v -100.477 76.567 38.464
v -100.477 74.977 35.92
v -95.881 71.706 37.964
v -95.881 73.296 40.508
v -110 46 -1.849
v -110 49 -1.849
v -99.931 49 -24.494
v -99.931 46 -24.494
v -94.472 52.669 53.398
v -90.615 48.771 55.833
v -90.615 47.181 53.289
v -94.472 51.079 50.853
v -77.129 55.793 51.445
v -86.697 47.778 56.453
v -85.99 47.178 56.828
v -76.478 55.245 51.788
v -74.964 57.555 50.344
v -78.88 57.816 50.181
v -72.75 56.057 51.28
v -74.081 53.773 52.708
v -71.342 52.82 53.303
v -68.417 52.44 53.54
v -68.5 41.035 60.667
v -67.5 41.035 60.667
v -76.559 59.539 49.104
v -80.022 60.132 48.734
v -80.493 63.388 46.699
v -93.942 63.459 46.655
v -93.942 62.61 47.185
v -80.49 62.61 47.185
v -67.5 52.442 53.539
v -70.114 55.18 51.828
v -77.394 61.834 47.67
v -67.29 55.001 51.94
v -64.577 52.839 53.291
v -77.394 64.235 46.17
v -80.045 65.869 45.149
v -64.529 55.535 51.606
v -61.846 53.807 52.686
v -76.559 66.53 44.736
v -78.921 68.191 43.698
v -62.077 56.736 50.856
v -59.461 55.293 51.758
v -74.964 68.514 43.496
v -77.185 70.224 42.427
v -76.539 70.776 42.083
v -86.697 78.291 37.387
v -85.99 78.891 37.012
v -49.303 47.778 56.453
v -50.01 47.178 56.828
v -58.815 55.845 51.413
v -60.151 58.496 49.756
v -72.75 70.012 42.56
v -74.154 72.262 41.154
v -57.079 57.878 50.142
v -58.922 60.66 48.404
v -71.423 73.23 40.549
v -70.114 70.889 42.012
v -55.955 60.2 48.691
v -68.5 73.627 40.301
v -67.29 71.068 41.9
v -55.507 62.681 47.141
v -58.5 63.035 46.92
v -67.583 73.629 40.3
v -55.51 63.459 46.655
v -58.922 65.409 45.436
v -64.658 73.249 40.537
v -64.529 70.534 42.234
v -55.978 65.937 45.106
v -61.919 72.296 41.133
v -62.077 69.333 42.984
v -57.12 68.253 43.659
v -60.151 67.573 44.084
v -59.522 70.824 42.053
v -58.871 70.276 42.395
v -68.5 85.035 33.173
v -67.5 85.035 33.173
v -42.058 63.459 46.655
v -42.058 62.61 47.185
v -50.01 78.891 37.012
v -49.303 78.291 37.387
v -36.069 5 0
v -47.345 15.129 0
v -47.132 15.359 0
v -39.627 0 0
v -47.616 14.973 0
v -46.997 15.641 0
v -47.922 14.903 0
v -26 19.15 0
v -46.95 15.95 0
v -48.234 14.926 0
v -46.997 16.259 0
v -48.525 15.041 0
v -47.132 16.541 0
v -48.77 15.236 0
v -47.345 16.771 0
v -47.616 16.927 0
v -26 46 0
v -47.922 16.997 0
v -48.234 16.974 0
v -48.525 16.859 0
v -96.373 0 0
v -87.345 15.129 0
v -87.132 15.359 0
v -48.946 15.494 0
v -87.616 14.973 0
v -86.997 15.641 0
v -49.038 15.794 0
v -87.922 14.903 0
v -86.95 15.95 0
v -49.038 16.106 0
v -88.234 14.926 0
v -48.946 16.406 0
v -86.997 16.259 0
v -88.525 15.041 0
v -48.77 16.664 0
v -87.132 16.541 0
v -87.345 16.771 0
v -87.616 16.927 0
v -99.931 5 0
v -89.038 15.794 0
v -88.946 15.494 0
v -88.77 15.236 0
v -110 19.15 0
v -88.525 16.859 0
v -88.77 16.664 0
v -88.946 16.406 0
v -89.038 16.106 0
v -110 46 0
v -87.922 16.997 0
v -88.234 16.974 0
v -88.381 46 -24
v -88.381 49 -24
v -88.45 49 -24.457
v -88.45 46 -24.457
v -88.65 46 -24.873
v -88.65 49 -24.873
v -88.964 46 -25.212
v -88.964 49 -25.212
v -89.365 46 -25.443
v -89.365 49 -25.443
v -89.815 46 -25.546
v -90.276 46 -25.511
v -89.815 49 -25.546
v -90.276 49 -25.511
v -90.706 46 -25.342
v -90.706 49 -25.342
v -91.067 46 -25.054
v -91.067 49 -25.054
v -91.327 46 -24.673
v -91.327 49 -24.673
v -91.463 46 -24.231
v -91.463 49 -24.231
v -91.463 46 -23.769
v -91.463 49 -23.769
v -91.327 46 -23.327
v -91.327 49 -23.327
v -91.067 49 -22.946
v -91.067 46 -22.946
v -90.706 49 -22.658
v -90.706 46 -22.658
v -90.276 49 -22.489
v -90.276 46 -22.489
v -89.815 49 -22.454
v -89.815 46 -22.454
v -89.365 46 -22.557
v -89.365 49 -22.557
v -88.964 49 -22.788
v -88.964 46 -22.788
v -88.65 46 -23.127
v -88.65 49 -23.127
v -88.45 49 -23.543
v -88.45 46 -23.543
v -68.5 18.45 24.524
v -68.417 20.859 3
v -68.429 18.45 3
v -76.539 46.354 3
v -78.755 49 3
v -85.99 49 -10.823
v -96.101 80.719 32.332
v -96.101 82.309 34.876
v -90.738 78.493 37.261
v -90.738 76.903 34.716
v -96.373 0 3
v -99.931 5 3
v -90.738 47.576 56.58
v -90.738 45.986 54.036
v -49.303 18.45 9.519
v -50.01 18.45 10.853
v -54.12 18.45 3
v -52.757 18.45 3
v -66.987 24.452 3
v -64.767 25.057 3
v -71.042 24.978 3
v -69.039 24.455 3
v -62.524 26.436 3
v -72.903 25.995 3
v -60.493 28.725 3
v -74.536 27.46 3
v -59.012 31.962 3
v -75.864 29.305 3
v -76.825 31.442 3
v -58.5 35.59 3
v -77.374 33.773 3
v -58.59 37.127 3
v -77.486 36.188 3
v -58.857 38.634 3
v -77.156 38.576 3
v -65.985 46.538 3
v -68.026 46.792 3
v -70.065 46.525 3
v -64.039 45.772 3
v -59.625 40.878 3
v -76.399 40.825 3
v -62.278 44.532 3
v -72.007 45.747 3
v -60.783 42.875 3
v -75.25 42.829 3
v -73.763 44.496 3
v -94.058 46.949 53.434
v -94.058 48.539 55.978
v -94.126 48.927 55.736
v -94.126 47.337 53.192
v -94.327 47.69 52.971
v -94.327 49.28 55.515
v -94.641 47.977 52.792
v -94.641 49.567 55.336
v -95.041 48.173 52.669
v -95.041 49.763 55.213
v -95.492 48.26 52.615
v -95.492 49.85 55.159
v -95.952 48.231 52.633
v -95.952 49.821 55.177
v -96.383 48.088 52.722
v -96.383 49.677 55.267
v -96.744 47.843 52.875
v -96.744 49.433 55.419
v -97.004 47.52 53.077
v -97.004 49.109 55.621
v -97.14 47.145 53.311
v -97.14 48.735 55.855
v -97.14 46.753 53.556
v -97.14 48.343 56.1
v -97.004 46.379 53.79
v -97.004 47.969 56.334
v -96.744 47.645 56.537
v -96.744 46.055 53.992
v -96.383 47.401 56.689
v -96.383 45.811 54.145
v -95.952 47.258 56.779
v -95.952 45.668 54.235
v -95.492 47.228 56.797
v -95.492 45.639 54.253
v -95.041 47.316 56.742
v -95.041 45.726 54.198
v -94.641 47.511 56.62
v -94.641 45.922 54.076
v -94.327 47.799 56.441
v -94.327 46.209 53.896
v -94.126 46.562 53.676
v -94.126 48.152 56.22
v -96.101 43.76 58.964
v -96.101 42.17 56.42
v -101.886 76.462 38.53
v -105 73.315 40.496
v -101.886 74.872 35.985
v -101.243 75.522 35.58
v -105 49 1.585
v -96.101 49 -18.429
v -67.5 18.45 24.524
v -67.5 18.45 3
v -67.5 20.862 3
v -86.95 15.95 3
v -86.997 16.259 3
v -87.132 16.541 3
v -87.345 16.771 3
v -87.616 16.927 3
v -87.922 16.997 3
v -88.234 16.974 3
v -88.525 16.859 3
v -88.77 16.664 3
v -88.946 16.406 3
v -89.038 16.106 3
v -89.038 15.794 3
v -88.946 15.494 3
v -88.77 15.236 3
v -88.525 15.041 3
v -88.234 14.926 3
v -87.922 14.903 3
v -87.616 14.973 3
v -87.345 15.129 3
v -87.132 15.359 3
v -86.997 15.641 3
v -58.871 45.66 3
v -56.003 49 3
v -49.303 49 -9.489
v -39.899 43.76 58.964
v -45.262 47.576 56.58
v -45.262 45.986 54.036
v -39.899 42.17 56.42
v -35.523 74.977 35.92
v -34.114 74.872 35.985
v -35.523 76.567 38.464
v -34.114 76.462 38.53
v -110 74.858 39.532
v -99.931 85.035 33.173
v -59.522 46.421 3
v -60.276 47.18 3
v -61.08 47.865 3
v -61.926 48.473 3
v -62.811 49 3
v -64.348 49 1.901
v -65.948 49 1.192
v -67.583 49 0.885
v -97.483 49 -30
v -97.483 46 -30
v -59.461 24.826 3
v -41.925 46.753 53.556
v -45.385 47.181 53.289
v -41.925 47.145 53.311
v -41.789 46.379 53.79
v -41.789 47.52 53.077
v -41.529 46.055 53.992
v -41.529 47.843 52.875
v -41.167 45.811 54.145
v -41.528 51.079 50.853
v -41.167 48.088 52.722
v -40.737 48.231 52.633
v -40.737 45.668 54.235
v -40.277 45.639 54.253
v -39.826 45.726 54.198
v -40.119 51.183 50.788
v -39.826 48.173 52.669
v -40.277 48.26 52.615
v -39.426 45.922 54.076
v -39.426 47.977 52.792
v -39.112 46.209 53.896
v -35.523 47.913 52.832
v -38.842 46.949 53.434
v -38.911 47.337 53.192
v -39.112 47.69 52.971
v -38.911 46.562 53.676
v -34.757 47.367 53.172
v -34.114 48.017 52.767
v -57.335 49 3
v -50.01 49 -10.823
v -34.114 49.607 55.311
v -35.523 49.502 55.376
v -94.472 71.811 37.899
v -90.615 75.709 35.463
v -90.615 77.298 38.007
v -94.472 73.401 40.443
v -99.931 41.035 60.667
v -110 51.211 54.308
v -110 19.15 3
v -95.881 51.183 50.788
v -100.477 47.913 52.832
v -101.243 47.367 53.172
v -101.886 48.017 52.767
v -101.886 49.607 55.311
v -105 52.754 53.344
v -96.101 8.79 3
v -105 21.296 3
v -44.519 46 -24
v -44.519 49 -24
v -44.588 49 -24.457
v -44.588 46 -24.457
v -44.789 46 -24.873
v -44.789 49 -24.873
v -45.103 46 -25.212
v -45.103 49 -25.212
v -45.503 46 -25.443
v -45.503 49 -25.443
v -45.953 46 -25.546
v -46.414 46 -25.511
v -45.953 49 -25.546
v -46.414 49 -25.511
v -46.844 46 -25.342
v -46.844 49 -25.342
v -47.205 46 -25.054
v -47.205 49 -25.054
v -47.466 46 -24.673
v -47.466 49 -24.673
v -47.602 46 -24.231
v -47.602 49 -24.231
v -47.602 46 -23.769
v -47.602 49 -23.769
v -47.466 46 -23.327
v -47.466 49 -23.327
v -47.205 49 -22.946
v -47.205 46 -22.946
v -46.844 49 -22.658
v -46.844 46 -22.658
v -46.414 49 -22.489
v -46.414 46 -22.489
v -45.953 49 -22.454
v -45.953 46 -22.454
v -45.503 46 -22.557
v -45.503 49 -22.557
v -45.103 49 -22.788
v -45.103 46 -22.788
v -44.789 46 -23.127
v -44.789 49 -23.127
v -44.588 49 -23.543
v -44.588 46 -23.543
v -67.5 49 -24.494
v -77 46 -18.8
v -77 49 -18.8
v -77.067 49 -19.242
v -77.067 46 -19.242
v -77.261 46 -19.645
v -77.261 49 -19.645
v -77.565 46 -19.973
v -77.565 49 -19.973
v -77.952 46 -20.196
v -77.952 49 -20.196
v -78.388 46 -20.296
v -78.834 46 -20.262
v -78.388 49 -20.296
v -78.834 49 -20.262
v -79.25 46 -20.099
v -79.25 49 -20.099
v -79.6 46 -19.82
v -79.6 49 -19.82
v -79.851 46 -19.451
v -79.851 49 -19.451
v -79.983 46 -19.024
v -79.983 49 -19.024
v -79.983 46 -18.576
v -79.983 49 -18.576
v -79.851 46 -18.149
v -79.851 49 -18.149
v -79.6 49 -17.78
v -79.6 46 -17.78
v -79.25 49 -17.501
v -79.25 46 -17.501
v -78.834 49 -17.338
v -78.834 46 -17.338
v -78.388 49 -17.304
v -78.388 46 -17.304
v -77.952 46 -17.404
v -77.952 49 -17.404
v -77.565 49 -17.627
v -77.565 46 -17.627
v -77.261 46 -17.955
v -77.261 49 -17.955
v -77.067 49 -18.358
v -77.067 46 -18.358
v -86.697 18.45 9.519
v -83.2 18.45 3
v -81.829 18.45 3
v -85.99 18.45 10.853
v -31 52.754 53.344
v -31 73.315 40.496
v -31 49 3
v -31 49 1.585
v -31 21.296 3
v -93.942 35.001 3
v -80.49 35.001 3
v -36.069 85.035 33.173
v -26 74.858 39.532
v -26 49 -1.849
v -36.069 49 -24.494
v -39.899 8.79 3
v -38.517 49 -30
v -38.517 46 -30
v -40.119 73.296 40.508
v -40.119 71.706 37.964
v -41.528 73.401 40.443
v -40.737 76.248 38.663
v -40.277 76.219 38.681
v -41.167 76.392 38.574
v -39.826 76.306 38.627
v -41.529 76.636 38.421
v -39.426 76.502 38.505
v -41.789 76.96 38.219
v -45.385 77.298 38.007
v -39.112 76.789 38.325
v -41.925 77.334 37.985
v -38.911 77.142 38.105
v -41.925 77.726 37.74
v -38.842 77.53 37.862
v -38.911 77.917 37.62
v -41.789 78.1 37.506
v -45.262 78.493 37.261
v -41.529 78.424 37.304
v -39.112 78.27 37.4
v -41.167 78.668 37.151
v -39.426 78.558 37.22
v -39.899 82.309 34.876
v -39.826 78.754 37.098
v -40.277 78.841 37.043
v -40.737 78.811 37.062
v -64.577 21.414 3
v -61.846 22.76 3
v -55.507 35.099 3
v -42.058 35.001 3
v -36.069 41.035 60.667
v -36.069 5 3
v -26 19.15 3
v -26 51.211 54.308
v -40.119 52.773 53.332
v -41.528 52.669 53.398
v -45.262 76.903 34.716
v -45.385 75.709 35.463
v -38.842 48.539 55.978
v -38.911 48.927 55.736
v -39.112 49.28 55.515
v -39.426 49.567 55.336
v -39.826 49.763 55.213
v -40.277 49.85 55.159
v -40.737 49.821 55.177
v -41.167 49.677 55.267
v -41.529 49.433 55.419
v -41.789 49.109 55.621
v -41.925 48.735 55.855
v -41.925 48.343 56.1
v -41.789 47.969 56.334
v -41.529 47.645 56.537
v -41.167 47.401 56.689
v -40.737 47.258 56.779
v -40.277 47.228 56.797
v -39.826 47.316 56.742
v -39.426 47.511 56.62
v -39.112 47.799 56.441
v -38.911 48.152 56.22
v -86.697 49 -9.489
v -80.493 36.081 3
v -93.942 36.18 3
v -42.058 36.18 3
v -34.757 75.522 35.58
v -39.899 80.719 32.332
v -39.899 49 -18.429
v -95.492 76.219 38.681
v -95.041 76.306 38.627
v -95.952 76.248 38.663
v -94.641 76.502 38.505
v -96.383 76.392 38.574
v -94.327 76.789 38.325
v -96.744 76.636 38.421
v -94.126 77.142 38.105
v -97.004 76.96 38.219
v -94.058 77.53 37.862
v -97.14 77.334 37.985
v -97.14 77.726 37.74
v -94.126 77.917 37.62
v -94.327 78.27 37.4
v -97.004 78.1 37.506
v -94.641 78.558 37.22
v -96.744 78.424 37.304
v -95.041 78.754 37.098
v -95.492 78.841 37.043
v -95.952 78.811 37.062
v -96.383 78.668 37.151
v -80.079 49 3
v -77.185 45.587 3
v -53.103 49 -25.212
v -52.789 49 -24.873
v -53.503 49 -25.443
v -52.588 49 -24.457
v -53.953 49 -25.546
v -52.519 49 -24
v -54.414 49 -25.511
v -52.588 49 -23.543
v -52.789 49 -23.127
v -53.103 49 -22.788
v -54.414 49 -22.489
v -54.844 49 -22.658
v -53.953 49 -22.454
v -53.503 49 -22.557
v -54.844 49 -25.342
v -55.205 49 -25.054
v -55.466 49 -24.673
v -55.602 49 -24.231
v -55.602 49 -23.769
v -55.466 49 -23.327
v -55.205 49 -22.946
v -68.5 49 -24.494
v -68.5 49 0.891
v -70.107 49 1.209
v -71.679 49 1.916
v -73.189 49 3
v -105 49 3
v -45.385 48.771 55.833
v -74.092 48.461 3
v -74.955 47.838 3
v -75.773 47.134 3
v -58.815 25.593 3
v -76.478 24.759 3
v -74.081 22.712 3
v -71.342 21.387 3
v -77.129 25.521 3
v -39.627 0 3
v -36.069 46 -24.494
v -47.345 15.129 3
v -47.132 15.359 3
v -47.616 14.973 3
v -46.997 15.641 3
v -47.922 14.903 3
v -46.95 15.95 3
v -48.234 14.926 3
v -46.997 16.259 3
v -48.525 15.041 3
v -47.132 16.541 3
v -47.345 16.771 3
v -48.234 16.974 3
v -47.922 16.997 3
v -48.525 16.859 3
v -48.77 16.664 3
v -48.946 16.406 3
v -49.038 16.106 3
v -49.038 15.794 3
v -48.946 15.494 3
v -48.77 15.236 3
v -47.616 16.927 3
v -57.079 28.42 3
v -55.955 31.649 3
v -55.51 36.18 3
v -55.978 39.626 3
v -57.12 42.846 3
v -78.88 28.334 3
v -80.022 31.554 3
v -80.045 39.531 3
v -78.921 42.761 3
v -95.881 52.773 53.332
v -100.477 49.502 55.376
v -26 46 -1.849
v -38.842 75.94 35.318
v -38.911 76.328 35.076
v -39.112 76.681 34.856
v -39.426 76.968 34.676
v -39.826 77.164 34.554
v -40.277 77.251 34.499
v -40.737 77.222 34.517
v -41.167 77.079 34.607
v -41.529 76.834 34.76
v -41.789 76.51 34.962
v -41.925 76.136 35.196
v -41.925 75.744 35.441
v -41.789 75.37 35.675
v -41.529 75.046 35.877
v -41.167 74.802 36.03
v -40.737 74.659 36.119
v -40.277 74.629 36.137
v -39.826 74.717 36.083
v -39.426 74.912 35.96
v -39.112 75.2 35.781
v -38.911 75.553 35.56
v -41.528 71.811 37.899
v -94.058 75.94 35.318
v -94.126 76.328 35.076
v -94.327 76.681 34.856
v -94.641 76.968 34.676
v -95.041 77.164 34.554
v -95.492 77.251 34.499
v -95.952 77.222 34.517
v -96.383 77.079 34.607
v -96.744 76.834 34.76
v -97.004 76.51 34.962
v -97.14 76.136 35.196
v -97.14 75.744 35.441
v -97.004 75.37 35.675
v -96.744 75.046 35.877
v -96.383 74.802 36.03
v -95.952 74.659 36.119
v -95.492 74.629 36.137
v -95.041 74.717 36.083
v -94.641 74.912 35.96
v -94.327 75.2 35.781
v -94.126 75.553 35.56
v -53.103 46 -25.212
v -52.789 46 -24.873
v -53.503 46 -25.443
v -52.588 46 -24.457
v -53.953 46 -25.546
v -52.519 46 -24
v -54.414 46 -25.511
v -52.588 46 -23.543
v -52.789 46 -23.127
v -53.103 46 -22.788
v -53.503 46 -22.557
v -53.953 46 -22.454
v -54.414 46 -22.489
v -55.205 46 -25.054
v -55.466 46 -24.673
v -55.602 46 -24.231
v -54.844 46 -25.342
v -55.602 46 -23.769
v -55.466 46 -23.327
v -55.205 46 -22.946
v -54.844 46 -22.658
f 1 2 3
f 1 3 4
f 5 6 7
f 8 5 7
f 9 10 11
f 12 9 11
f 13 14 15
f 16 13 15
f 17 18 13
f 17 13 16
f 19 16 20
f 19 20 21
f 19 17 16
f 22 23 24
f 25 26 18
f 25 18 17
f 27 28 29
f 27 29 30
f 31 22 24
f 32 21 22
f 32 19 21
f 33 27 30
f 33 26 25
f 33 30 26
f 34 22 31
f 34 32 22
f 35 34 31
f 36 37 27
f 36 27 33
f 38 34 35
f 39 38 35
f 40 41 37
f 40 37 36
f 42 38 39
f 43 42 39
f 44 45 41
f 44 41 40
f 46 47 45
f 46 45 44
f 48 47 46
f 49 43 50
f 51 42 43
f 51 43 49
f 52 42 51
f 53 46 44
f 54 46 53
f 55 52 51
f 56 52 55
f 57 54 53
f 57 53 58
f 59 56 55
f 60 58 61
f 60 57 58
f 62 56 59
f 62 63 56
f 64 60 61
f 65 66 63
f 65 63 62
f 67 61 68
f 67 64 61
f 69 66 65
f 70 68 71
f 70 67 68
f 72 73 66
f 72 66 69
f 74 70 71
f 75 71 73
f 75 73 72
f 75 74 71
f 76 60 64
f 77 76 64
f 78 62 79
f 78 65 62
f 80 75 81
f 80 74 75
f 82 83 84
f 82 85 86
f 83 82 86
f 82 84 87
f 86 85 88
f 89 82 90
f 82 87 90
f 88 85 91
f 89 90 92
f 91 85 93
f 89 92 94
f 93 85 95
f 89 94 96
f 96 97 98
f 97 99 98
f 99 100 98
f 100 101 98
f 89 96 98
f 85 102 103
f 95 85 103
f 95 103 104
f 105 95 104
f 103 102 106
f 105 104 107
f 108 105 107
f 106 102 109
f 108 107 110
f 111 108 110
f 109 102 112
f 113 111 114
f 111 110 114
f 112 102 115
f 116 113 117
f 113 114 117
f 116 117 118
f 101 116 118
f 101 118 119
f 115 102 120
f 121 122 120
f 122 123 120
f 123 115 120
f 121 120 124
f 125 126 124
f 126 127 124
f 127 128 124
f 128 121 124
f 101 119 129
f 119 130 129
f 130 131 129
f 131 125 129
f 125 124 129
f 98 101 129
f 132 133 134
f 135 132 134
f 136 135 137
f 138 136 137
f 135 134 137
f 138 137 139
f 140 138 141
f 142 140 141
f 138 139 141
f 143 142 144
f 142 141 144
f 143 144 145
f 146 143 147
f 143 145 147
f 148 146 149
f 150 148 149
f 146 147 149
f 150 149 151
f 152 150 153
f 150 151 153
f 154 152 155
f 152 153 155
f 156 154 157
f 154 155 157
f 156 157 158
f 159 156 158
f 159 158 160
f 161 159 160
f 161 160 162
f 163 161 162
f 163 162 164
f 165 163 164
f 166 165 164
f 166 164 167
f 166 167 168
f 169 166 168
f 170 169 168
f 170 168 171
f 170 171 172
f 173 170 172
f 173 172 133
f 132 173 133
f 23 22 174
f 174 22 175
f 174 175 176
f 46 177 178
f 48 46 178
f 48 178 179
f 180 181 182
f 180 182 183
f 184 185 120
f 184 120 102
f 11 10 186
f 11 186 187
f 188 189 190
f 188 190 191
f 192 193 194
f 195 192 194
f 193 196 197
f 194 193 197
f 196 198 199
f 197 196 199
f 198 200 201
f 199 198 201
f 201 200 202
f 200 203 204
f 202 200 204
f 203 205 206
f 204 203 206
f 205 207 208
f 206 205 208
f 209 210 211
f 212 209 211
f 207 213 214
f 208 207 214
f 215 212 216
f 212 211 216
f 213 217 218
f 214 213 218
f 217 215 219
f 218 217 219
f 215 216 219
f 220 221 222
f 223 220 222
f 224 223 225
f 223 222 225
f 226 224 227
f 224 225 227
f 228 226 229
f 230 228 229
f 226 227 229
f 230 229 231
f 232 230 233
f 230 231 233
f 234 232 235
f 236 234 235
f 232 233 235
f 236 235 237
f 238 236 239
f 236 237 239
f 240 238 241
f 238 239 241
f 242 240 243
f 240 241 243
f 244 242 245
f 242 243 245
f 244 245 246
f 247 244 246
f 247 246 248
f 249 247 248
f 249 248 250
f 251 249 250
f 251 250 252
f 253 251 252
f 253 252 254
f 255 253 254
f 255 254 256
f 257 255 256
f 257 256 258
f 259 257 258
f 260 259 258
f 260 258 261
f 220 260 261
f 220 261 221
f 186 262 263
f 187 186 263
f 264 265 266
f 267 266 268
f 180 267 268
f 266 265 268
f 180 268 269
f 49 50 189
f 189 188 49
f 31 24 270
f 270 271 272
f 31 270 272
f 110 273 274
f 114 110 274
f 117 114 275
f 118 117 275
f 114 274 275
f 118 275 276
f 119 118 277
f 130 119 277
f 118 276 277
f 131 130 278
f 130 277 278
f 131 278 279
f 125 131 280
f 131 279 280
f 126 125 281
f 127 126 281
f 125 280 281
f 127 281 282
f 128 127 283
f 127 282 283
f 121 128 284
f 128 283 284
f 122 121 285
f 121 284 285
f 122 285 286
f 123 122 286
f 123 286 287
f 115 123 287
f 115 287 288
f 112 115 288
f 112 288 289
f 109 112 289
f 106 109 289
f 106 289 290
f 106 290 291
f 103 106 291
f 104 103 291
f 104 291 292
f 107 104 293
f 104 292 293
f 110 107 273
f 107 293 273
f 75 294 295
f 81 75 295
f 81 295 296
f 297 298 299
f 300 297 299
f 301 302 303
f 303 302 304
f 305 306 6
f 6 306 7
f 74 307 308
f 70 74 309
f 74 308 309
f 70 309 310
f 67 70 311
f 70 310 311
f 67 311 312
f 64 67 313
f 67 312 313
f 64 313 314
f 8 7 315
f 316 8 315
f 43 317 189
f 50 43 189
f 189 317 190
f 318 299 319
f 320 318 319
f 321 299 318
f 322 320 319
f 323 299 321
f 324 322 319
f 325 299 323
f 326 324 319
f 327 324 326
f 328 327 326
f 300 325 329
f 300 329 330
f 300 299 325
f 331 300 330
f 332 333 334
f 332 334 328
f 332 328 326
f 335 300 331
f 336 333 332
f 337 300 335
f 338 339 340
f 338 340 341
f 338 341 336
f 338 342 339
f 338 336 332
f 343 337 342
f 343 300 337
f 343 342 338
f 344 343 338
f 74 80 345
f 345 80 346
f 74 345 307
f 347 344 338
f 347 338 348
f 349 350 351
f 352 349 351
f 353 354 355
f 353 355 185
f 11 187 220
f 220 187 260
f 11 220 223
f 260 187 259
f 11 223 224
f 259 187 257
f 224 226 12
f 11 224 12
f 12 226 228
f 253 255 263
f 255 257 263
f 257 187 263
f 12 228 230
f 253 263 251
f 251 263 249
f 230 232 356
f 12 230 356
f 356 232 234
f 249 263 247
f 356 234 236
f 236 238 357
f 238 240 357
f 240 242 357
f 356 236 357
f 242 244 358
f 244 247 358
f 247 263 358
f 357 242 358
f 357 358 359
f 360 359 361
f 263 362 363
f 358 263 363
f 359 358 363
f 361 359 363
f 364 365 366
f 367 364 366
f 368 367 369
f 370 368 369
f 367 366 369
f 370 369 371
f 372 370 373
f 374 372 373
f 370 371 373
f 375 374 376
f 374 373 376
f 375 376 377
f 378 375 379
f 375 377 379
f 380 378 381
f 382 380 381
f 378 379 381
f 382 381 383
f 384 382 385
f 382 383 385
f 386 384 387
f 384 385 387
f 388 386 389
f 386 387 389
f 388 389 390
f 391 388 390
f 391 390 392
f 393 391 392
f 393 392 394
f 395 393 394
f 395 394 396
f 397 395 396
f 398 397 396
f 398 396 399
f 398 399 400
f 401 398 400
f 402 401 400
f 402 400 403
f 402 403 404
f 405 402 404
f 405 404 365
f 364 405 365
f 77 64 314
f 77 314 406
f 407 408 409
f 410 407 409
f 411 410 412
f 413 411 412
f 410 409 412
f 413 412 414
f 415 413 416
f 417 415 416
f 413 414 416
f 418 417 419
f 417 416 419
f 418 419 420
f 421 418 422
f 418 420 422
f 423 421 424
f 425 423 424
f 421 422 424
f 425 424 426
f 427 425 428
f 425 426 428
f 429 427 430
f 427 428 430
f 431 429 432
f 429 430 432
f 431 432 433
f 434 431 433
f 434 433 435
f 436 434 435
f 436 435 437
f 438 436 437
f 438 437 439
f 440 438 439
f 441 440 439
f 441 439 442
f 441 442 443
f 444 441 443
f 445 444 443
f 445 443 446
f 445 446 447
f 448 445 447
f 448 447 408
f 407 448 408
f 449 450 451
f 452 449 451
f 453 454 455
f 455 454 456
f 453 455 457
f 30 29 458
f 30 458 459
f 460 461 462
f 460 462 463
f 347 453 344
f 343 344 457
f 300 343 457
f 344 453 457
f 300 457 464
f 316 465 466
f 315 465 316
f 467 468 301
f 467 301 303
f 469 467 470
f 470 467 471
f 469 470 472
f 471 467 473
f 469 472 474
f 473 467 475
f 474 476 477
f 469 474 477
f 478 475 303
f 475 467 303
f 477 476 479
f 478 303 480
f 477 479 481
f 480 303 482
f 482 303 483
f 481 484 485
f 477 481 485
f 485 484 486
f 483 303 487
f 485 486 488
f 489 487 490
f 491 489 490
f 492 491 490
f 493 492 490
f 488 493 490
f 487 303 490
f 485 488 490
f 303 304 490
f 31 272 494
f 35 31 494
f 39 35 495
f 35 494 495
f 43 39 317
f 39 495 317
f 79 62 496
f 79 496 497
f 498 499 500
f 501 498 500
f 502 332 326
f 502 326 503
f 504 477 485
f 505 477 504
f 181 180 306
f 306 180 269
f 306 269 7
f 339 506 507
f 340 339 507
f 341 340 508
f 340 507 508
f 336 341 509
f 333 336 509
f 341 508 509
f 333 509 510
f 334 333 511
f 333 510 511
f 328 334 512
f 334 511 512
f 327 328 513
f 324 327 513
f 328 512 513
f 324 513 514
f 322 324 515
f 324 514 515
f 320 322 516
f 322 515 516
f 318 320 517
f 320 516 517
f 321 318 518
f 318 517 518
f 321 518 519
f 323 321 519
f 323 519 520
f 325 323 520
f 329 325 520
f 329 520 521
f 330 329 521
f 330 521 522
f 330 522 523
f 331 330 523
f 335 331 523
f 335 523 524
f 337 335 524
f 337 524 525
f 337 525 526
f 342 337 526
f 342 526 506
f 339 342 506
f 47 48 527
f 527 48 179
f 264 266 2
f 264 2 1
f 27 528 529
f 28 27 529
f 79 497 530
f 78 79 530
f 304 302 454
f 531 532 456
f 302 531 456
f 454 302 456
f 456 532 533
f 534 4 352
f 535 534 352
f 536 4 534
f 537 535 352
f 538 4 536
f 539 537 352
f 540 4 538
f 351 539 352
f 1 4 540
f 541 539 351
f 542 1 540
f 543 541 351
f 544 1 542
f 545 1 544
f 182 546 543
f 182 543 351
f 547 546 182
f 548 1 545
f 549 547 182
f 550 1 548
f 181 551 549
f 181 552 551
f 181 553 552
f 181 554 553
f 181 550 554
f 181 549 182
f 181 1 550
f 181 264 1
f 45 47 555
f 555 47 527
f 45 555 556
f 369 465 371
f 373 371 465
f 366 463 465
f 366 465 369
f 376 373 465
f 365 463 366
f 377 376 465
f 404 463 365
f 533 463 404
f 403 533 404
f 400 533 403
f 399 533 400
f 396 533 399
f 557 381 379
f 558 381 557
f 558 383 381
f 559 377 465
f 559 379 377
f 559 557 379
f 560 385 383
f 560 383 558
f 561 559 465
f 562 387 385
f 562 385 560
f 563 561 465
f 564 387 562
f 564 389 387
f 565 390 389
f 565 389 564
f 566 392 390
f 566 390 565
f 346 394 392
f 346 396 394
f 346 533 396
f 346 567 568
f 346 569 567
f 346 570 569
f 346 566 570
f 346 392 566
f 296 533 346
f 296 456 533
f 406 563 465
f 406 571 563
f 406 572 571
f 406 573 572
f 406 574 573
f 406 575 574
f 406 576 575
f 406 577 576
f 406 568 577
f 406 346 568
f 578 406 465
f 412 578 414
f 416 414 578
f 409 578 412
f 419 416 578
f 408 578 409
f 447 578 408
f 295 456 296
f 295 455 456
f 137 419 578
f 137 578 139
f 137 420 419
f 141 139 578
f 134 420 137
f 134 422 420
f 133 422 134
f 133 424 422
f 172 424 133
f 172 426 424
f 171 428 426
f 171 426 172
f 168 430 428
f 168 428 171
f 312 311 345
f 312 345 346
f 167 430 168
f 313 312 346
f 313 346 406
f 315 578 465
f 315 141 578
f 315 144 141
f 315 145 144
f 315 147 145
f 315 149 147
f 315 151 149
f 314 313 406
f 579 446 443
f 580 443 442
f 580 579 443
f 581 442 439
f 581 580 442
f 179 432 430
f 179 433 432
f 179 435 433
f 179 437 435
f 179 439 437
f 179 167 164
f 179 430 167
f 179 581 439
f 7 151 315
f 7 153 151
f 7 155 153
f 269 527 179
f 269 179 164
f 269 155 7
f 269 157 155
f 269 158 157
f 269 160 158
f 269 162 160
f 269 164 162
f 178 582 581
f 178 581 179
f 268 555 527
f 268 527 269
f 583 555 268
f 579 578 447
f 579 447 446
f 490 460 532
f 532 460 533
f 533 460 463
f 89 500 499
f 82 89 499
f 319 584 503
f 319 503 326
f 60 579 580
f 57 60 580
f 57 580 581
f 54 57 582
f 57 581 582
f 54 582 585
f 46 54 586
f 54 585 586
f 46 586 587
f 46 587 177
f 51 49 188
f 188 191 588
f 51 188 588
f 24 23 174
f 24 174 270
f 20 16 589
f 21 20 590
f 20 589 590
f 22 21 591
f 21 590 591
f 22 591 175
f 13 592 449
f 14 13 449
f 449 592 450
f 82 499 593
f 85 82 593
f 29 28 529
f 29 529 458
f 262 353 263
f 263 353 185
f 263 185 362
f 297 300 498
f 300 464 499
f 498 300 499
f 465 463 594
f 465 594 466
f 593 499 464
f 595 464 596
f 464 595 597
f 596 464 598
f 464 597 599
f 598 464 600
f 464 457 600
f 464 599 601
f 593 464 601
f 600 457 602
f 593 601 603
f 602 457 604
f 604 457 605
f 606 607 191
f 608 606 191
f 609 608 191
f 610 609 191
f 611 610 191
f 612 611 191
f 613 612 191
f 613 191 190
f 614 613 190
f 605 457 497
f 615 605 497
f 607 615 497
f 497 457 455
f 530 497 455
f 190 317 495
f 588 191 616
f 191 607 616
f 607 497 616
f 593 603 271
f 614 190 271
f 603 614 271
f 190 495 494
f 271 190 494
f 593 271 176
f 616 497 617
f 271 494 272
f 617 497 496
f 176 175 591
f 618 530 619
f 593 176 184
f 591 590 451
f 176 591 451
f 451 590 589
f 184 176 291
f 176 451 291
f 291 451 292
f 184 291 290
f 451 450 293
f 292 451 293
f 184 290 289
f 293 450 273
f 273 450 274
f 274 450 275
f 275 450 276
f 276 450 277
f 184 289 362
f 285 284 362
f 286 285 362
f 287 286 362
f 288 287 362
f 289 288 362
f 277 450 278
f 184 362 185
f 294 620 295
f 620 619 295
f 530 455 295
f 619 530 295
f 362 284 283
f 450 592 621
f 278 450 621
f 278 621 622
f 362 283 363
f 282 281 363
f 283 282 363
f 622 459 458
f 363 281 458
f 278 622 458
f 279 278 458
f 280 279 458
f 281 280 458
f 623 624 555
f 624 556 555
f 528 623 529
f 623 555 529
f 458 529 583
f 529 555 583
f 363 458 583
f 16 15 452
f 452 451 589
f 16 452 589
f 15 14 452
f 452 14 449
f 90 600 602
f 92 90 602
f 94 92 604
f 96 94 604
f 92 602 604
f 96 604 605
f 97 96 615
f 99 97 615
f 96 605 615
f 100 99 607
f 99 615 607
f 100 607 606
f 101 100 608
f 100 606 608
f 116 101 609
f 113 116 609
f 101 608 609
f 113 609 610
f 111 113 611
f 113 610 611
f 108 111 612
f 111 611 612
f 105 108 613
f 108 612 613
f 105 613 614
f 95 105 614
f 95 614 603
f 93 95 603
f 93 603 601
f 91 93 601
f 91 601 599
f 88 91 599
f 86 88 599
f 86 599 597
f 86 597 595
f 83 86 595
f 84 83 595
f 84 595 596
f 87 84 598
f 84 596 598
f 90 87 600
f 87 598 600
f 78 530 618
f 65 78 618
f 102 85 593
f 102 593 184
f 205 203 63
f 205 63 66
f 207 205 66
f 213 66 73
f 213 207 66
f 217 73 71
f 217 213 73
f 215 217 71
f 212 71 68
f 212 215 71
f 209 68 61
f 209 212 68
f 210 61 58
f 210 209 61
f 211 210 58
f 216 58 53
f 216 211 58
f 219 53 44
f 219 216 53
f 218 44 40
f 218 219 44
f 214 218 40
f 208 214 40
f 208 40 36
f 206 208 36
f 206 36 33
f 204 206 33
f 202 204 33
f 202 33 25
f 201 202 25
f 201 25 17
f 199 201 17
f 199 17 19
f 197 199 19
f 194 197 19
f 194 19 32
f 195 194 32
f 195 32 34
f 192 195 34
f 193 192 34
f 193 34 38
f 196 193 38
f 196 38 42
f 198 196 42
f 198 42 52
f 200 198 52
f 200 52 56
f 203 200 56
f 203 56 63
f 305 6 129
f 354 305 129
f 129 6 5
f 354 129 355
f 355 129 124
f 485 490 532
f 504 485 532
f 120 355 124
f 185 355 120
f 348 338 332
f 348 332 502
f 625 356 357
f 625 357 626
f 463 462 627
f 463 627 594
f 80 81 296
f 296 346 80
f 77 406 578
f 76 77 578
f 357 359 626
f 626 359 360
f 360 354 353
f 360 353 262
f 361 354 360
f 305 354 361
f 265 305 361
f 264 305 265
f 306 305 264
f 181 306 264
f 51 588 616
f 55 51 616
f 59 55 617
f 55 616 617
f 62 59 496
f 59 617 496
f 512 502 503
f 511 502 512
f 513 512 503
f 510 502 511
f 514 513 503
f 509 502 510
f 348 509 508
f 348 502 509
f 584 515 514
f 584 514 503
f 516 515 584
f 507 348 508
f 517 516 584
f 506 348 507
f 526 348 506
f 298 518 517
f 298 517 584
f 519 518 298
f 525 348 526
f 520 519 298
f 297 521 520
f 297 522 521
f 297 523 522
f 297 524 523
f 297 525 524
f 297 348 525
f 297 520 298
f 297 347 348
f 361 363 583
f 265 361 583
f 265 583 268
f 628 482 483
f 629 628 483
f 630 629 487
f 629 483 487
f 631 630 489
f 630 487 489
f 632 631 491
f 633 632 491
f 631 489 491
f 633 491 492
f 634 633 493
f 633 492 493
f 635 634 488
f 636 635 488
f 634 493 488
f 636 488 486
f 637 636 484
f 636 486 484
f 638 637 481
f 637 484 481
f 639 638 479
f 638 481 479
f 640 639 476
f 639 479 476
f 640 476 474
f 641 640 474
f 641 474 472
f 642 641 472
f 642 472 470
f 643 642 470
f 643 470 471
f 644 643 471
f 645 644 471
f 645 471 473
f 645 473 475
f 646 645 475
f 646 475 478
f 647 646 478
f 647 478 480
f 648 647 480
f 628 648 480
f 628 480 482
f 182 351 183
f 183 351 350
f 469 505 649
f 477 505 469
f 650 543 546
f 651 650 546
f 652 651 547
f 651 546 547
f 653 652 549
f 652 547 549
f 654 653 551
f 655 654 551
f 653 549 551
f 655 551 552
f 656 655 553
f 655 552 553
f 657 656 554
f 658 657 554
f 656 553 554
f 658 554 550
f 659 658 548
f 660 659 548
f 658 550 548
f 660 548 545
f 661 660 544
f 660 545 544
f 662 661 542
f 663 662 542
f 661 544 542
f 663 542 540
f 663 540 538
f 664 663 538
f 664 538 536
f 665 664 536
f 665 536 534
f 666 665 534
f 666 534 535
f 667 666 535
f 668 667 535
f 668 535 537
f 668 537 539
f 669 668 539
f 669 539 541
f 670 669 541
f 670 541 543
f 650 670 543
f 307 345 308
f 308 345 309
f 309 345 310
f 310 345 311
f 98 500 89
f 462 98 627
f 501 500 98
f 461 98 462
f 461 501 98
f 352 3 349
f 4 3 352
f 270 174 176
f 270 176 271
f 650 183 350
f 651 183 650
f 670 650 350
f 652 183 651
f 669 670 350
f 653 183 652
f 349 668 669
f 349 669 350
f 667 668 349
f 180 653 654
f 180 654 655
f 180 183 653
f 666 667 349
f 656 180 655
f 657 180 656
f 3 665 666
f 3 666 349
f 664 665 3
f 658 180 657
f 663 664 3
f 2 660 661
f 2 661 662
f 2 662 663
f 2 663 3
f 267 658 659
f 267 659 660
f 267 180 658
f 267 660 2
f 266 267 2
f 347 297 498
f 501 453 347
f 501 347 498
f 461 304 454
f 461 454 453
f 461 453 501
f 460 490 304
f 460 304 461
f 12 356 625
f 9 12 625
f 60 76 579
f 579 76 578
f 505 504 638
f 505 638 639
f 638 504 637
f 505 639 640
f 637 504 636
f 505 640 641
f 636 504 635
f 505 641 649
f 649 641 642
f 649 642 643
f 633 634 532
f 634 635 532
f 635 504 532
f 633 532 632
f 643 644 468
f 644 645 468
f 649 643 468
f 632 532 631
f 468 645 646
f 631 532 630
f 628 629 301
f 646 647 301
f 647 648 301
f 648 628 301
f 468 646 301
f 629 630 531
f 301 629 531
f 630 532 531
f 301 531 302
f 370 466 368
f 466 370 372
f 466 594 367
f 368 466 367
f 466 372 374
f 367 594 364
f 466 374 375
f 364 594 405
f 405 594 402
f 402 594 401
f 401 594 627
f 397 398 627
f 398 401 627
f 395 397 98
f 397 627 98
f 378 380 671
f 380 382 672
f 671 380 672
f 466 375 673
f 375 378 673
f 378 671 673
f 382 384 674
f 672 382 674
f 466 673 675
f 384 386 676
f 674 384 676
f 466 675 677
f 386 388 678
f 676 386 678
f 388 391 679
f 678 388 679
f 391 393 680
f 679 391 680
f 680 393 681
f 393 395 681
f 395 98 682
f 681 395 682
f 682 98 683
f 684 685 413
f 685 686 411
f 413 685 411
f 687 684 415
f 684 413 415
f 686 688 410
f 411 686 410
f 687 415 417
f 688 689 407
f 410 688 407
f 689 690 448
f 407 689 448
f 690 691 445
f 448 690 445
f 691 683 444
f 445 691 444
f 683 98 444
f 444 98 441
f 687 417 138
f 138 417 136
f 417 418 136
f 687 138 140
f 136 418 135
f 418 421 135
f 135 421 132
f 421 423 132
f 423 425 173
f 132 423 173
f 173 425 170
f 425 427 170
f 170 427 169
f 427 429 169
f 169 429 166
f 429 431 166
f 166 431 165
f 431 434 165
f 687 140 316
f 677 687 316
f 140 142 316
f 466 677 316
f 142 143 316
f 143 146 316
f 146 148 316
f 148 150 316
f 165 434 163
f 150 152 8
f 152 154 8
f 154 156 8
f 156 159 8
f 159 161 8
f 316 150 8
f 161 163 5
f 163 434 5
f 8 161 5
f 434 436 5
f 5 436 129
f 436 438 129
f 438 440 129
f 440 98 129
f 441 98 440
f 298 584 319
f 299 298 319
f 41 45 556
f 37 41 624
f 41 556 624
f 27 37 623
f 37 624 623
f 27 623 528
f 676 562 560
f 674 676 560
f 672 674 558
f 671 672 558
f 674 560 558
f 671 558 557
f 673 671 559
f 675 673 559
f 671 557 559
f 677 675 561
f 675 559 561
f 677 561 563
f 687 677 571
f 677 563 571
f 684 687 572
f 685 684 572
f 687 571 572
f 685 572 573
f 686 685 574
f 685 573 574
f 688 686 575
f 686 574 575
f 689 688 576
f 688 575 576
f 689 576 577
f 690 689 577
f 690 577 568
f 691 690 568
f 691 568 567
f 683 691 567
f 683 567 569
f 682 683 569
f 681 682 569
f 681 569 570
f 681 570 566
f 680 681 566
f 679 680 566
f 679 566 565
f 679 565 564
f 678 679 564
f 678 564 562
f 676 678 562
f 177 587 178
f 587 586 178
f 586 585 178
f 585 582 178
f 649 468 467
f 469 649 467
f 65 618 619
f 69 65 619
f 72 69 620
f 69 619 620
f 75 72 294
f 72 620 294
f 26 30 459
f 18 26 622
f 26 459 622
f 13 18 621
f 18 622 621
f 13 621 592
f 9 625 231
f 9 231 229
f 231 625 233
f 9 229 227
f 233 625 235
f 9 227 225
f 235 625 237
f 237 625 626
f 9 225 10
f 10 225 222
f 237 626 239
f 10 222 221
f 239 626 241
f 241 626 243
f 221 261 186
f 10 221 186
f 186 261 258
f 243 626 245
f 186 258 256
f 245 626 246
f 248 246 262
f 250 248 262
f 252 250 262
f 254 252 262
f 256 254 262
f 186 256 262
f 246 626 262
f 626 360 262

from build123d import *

# Parameters (mm, degrees)
BOSS_EXTRUDE1_DEPTH = 3
SKETCH3_W           = 84
SKETCH3_H           = 3
BOSS_EXTRUDE2_DEPTH = 30
BOSS_EXTRUDE3_DEPTH = 68
SKETCH8_R           = 9.5
BOSS_EXTRUDE4_DEPTH = 68
SKETCH9_W           = 30
SKETCH9_H           = 46
CUT_EXTRUDE3_DEPTH  = 85
CUT_EXTRUDE4_DEPTH  = 68
CUT_EXTRUDE5_DEPTH  = 68
BOSS_EXTRUDE5_DEPTH = 8
CHAMFER1_SIZE       = 1
BOSS_EXTRUDE6_DEPTH = 8
CHAMFER2_SIZE       = 1
BOSS_EXTRUDE7_DEPTH = 8
CHAMFER3_SIZE       = 1
BOSS_EXTRUDE8_DEPTH = 8
CHAMFER4_SIZE       = 1
CUT_EXTRUDE6_REACH  = 100.635
SKETCH17_R          = 1.55
CUT_EXTRUDE7_REACH  = 51
SKETCH18_R          = 1.55
SKETCH18_R_2        = 1.5
SKETCH21_W          = 45
SKETCH21_H          = 22
CUT_EXTRUDE8_DEPTH  = 58.667270539
SKETCH22_R          = 1.05
CUT_EXTRUDE9_DEPTH  = 3


with BuildPart() as part:
    # Sketch2 → Boss-Extrude1 (new body)
    with BuildSketch(Plane.XY):
        Polygon((-110, 46), (-110, 49), (-26, 49), (-26, 46), (-26, 0), (-110, 0), align=None)
    extrude(amount=BOSS_EXTRUDE1_DEPTH)

    # Sketch3 → Boss-Extrude2 (add)
    with BuildSketch(Plane(origin=(0, 0, 0), x_dir=(-1, 0, 0), z_dir=(0, 0, -1))):
        with Locations((68, 47.5)):
            Rectangle(SKETCH3_W, SKETCH3_H)
    extrude(amount=BOSS_EXTRUDE2_DEPTH)

    # Sketch7 → Boss-Extrude3 (add)
    with BuildSketch(Plane(origin=(0, 2.752263202, 4.404541836), x_dir=(1, 0, 0), z_dir=(0, 0.529919264, 0.848048096))):
        Polygon((-110, 14.650482688), (-99.930804426, 2.650482688), (-96.10058221, 5.864420737), (-105, 16.470333859), (-105, 40.714481265), (-96.10058221, 51.320394388), (-99.930804426, 54.534332436), (-110, 42.534332436), align=None)
        Polygon((-39.89941779, 5.864420737), (-36.069195574, 2.650482688), (-26, 14.650482688), (-26, 39.964598919), (-26, 42.534332436), (-36.069195574, 54.534332436), (-39.89941779, 51.320394388), (-31, 40.714481265), (-31, 16.470333859), align=None)
    extrude(amount=BOSS_EXTRUDE3_DEPTH)

    # Sketch8 → Boss-Extrude4 (add)
    with BuildSketch(Plane(origin=(0, 2.752263202, 4.404541836), x_dir=(1, 0, 0), z_dir=(0, 0.529919264, 0.848048096))):
        with BuildLine():
            Line((-67.5, 54.534332436), (-68.5, 54.534332436))
            Line((-68.5, 54.534332436), (-68.5, 41.082403559))
            ThreePointArc((-68.5, 41.082403559), (-72.822037178, 40.124881601), (-76.539295111, 37.720958324))
            Line((-76.539295111, 37.720958324), (-85.990157605, 47.289671948))
            Line((-85.990157605, 47.289671948), (-86.697264386, 46.582565167))
            Line((-86.697264386, 46.582565167), (-77.185314257, 37.070615038))
            ThreePointArc((-77.185314257, 37.070615038), (-79.564385784, 33.337402971), (-80.493053625, 29.009074229))
            Line((-80.493053625, 29.009074229), (-93.941924874, 29.092407562))
            Line((-93.941924874, 29.092407562), (-93.941924874, 28.092407562))
            Line((-93.941924874, 28.092407562), (-80.489995997, 28.092407562))
            ThreePointArc((-80.489995997, 28.092407562), (-79.532474039, 23.770370384), (-77.128550762, 20.053112451))
            Line((-77.128550762, 20.053112451), (-86.697264386, 10.602249957))
            Line((-86.697264386, 10.602249957), (-85.990157605, 9.895143176))
            Line((-85.990157605, 9.895143176), (-76.478207476, 19.407093305))
            ThreePointArc((-76.478207476, 19.407093305), (-72.744995409, 17.028021778), (-68.416666667, 16.099353937))
            Line((-68.416666667, 16.099353937), (-68.5, 2.650482688))
            Line((-68.5, 2.650482688), (-67.5, 2.650482688))
            Line((-67.5, 2.650482688), (-67.5, 16.102411565))
            ThreePointArc((-67.5, 16.102411565), (-63.177962822, 17.059933523), (-59.460704889, 19.4638568))
            Line((-59.460704889, 19.4638568), (-50.009842395, 9.895143176))
            Line((-50.009842395, 9.895143176), (-49.302735614, 10.602249957))
            Line((-49.302735614, 10.602249957), (-58.814685743, 20.114200086))
            ThreePointArc((-58.814685743, 20.114200086), (-56.435614216, 23.847412153), (-55.506946375, 28.175740895))
            Line((-55.506946375, 28.175740895), (-42.058075126, 28.092407562))
            Line((-42.058075126, 28.092407562), (-42.058075126, 29.092407562))
            Line((-42.058075126, 29.092407562), (-55.510004003, 29.092407562))
            ThreePointArc((-55.510004003, 29.092407562), (-56.467525961, 33.41444474), (-58.871449238, 37.131702673))
            Line((-58.871449238, 37.131702673), (-49.302735614, 46.582565167))
            Line((-49.302735614, 46.582565167), (-50.009842395, 47.289671948))
            Line((-50.009842395, 47.289671948), (-59.521792524, 37.777721819))
            ThreePointArc((-59.521792524, 37.777721819), (-63.255004591, 40.156793346), (-67.583333333, 41.085461188))
            Line((-67.583333333, 41.085461188), (-67.5, 54.534332436))
        make_face()
        with Locations((-68, 28.592407562)):
            Circle(SKETCH8_R, mode=Mode.SUBTRACT)
    extrude(amount=BOSS_EXTRUDE4_DEPTH)

    # Sketch9 → Cut-Extrude3 (cut, through all)
    with BuildSketch(Plane.ZY.offset(110)):
        with Locations((-15, 23)):
            Rectangle(SKETCH9_W, SKETCH9_H)
    extrude(amount=-CUT_EXTRUDE3_DEPTH, mode=Mode.SUBTRACT)

    # Sketch11 → Cut-Extrude4 (cut)
    with BuildSketch(Plane(origin=(0, 49, 0), x_dir=(1, 0, 0), z_dir=(0, 1, 0))):
        Polygon((-26, 1.849292506), (-36.069195574, 24.494251484), (-38.517354506, 30), (-26, 30), align=None)
        Polygon((-110, 1.849292506), (-99.930804426, 24.494251484), (-97.482645494, 30), (-110, 30), align=None)
    extrude(amount=-CUT_EXTRUDE4_DEPTH, mode=Mode.SUBTRACT)

    # Sketch12 → Cut-Extrude5 (cut)
    with BuildSketch(Plane.XY.offset(3)):
        Polygon((-110, 19.15014084), (-99.930804426, 5), (-96.372820202, 0), (-110, 0), align=None)
        Polygon((-26, 19.15014084), (-36.069195574, 5), (-39.627179798, 0), (-26, 0), align=None)
    extrude(amount=-CUT_EXTRUDE5_DEPTH, mode=Mode.SUBTRACT)

    # Sketch13 → Boss-Extrude5 (add)
    with BuildSketch(Plane(origin=(-81.664497732, 58.112198911, -36.312532071), x_dir=(0.277530914, -0.197490123, -0.940199045), z_dir=(0.766044443, -0.545114809, 0.340625537))):
        Polygon((-75.716604077, 11.344887623), (-73.010640587, 10.049603257), (-76.464732228, 2.833700616), (-79.170695719, 4.128984981), align=None)
    extrude(amount=BOSS_EXTRUDE5_DEPTH)

    # Chamfer1
    chamfer1_edges = [part.edges().sort_by_distance(p)[0] for p in [
        (-101.242883088, 76.316916776, 36.851608258),
        (-95.114527543, 71.955998307, 39.576612555),
        (-89.972226665, 77.153138559, 36.329078894),
    ]]
    chamfer(chamfer1_edges, length=CHAMFER1_SIZE)

    # Sketch14 → Boss-Extrude6 (add)
    with BuildSketch(Plane(origin=(-53.506473088, -38.075037421, 23.791923957), x_dir=(-0.277530914, -0.197490123, -0.940199045), z_dir=(0.766044443, 0.545114809, -0.340625537))):
        Polygon((-37.409332735, 91.372162271), (-34.703369245, 90.076877905), (-31.249277603, 97.292780547), (-33.955241094, 98.588064912), align=None)
    extrude(amount=BOSS_EXTRUDE6_DEPTH)

    # Chamfer2
    chamfer2_edges = [part.edges().sort_by_distance(p)[0] for p in [
        (-101.242883088, 48.162345367, 54.444537047),
        (-89.972226665, 47.326123584, 54.967066411),
        (-95.114527543, 52.523263836, 51.71953275),
    ]]
    chamfer(chamfer2_edges, length=CHAMFER2_SIZE)

    # Sketch15 → Boss-Extrude7 (add)
    with BuildSketch(Plane(origin=(1.856421651, 1.321023789, -0.825467279), x_dir=(0.277530914, 0.197490123, 0.940199045), z_dir=(-0.766044443, -0.545114809, 0.340625537))):
        Polygon((37.972399808, 90.195865404), (35.266436317, 88.900581038), (38.720527959, 81.684678396), (41.426491449, 82.979962762), align=None)
    extrude(amount=BOSS_EXTRUDE7_DEPTH)

    # Chamfer3
    chamfer3_edges = [part.edges().sort_by_distance(p)[0] for p in [
        (-34.757116912, 76.316916776, 36.851608258),
        (-46.027773335, 77.153138559, 36.329078894),
        (-40.885472457, 71.955998307, 39.576612555),
    ]]
    chamfer(chamfer3_edges, length=CHAMFER3_SIZE)

    # Sketch16 → Boss-Extrude8 (add)
    with BuildSketch(Plane(origin=(-26.301602994, 18.716137701, -11.695140835), x_dir=(-0.277530914, 0.197490123, 0.940199045), z_dir=(-0.766044443, 0.545114809, -0.340625537))):
        Polygon((75.153537005, 12.52118449), (72.447573514, 11.225900124), (68.993481872, 18.441802766), (71.699445363, 19.737087131), align=None)
    extrude(amount=BOSS_EXTRUDE8_DEPTH)

    # Chamfer4
    chamfer4_edges = [part.edges().sort_by_distance(p)[0] for p in [
        (-34.757116912, 48.162345367, 54.444537047),
        (-40.885472457, 52.523263836, 51.71953275),
        (-46.027773335, 47.326123584, 54.967066411),
    ]]
    chamfer(chamfer4_edges, length=CHAMFER4_SIZE)

    # Sketch17 → Cut-Extrude6 (cut, up to next)
    with BuildSketch(Plane(origin=(0, 38.78677317, 62.071812375), x_dir=(1, 0, 0), z_dir=(0, 0.529919264, 0.848048096)), mode=Mode.PRIVATE) as cut_extrude6_sk1:
        with Locations((-95.607554877, 45.685066176)):
            Circle(SKETCH17_R)
    cut_extrude6_tool1 = extrude(cut_extrude6_sk1.sketch, amount=-CUT_EXTRUDE6_REACH, mode=Mode.PRIVATE) & part.part
    add(cut_extrude6_tool1.solids().sort_by_distance((-95.607555, 77.529907, 37.862416))[0], mode=Mode.SUBTRACT)
    # Sketch17 → Cut-Extrude6 (cut, up to next)
    with BuildSketch(Plane(origin=(0, 38.78677317, 62.071812375), x_dir=(1, 0, 0), z_dir=(0, 0.529919264, 0.848048096)), mode=Mode.PRIVATE) as cut_extrude6_sk2:
        with Locations((-95.607554877, 11.499748948)):
            Circle(SKETCH17_R)
    cut_extrude6_tool2 = extrude(cut_extrude6_sk2.sketch, amount=-CUT_EXTRUDE6_REACH, mode=Mode.PRIVATE) & part.part
    add(cut_extrude6_tool2.solids().sort_by_distance((-95.607555, 48.539113, 55.977874))[0], mode=Mode.SUBTRACT)
    # Sketch17 → Cut-Extrude6 (cut, up to next)
    with BuildSketch(Plane(origin=(0, 38.78677317, 62.071812375), x_dir=(1, 0, 0), z_dir=(0, 0.529919264, 0.848048096)), mode=Mode.PRIVATE) as cut_extrude6_sk3:
        with Locations((-40.392445123, 45.685066176)):
            Circle(SKETCH17_R)
    cut_extrude6_tool3 = extrude(cut_extrude6_sk3.sketch, amount=-CUT_EXTRUDE6_REACH, mode=Mode.PRIVATE) & part.part
    add(cut_extrude6_tool3.solids().sort_by_distance((-40.392445, 77.529907, 37.862416))[0], mode=Mode.SUBTRACT)
    # Sketch17 → Cut-Extrude6 (cut, up to next)
    with BuildSketch(Plane(origin=(0, 38.78677317, 62.071812375), x_dir=(1, 0, 0), z_dir=(0, 0.529919264, 0.848048096)), mode=Mode.PRIVATE) as cut_extrude6_sk4:
        with Locations((-40.392445123, 11.499748948)):
            Circle(SKETCH17_R)
    cut_extrude6_tool4 = extrude(cut_extrude6_sk4.sketch, amount=-CUT_EXTRUDE6_REACH, mode=Mode.PRIVATE) & part.part
    add(cut_extrude6_tool4.solids().sort_by_distance((-40.392445, 48.539113, 55.977874))[0], mode=Mode.SUBTRACT)

    # Sketch18 → Cut-Extrude7 (cut, up to next)
    with BuildSketch(Plane(origin=(0, 49, 0), x_dir=(1, 0, 0), z_dir=(0, 1, 0)), mode=Mode.PRIVATE) as cut_extrude7_sk1:
        with Locations((-89.930804426, 24)):
            Circle(SKETCH18_R)
    cut_extrude7_tool1 = extrude(cut_extrude7_sk1.sketch, amount=-CUT_EXTRUDE7_REACH, mode=Mode.PRIVATE) & part.part
    add(cut_extrude7_tool1.solids().sort_by_distance((-89.930804, 49, -24))[0], mode=Mode.SUBTRACT)
    # Sketch18 → Cut-Extrude7 (cut, up to next)
    with BuildSketch(Plane(origin=(0, 49, 0), x_dir=(1, 0, 0), z_dir=(0, 1, 0)), mode=Mode.PRIVATE) as cut_extrude7_sk2:
        with Locations((-54.069195574, 24)):
            Circle(SKETCH18_R)
    cut_extrude7_tool2 = extrude(cut_extrude7_sk2.sketch, amount=-CUT_EXTRUDE7_REACH, mode=Mode.PRIVATE) & part.part
    add(cut_extrude7_tool2.solids().sort_by_distance((-54.069196, 49, -24))[0], mode=Mode.SUBTRACT)
    # Sketch18 → Cut-Extrude7 (cut, up to next)
    with BuildSketch(Plane(origin=(0, 49, 0), x_dir=(1, 0, 0), z_dir=(0, 1, 0)), mode=Mode.PRIVATE) as cut_extrude7_sk3:
        with Locations((-46.069195574, 24)):
            Circle(SKETCH18_R)
    cut_extrude7_tool3 = extrude(cut_extrude7_sk3.sketch, amount=-CUT_EXTRUDE7_REACH, mode=Mode.PRIVATE) & part.part
    add(cut_extrude7_tool3.solids().sort_by_distance((-46.069196, 49, -24))[0], mode=Mode.SUBTRACT)
    # Sketch18 → Cut-Extrude7 (cut, up to next)
    with BuildSketch(Plane(origin=(0, 49, 0), x_dir=(1, 0, 0), z_dir=(0, 1, 0)), mode=Mode.PRIVATE) as cut_extrude7_sk4:
        with Locations((-78.5, 18.8)):
            Circle(SKETCH18_R_2)
    cut_extrude7_tool4 = extrude(cut_extrude7_sk4.sketch, amount=-CUT_EXTRUDE7_REACH, mode=Mode.PRIVATE) & part.part
    add(cut_extrude7_tool4.solids().sort_by_distance((-78.5, 49, -18.8))[0], mode=Mode.SUBTRACT)

    # Sketch21 → Cut-Extrude8 (cut, through all)
    with BuildSketch(Plane.XY.offset(3)):
        with Locations((-68, 7.45)):
            Rectangle(SKETCH21_W, SKETCH21_H)
    extrude(amount=CUT_EXTRUDE8_DEPTH, mode=Mode.SUBTRACT)

    # Sketch22 → Cut-Extrude9 (cut)
    with BuildSketch(Plane.XY.offset(3)):
        with Locations((-48, -1.05)):
            Circle(SKETCH22_R)
        with Locations((-88, -1.05)):
            Circle(SKETCH22_R)
        with Locations((-88, 15.95)):
            Circle(SKETCH22_R)
        with Locations((-48, 15.95)):
            Circle(SKETCH22_R)
    extrude(amount=-CUT_EXTRUDE9_DEPTH, mode=Mode.SUBTRACT)


solid = part.part
